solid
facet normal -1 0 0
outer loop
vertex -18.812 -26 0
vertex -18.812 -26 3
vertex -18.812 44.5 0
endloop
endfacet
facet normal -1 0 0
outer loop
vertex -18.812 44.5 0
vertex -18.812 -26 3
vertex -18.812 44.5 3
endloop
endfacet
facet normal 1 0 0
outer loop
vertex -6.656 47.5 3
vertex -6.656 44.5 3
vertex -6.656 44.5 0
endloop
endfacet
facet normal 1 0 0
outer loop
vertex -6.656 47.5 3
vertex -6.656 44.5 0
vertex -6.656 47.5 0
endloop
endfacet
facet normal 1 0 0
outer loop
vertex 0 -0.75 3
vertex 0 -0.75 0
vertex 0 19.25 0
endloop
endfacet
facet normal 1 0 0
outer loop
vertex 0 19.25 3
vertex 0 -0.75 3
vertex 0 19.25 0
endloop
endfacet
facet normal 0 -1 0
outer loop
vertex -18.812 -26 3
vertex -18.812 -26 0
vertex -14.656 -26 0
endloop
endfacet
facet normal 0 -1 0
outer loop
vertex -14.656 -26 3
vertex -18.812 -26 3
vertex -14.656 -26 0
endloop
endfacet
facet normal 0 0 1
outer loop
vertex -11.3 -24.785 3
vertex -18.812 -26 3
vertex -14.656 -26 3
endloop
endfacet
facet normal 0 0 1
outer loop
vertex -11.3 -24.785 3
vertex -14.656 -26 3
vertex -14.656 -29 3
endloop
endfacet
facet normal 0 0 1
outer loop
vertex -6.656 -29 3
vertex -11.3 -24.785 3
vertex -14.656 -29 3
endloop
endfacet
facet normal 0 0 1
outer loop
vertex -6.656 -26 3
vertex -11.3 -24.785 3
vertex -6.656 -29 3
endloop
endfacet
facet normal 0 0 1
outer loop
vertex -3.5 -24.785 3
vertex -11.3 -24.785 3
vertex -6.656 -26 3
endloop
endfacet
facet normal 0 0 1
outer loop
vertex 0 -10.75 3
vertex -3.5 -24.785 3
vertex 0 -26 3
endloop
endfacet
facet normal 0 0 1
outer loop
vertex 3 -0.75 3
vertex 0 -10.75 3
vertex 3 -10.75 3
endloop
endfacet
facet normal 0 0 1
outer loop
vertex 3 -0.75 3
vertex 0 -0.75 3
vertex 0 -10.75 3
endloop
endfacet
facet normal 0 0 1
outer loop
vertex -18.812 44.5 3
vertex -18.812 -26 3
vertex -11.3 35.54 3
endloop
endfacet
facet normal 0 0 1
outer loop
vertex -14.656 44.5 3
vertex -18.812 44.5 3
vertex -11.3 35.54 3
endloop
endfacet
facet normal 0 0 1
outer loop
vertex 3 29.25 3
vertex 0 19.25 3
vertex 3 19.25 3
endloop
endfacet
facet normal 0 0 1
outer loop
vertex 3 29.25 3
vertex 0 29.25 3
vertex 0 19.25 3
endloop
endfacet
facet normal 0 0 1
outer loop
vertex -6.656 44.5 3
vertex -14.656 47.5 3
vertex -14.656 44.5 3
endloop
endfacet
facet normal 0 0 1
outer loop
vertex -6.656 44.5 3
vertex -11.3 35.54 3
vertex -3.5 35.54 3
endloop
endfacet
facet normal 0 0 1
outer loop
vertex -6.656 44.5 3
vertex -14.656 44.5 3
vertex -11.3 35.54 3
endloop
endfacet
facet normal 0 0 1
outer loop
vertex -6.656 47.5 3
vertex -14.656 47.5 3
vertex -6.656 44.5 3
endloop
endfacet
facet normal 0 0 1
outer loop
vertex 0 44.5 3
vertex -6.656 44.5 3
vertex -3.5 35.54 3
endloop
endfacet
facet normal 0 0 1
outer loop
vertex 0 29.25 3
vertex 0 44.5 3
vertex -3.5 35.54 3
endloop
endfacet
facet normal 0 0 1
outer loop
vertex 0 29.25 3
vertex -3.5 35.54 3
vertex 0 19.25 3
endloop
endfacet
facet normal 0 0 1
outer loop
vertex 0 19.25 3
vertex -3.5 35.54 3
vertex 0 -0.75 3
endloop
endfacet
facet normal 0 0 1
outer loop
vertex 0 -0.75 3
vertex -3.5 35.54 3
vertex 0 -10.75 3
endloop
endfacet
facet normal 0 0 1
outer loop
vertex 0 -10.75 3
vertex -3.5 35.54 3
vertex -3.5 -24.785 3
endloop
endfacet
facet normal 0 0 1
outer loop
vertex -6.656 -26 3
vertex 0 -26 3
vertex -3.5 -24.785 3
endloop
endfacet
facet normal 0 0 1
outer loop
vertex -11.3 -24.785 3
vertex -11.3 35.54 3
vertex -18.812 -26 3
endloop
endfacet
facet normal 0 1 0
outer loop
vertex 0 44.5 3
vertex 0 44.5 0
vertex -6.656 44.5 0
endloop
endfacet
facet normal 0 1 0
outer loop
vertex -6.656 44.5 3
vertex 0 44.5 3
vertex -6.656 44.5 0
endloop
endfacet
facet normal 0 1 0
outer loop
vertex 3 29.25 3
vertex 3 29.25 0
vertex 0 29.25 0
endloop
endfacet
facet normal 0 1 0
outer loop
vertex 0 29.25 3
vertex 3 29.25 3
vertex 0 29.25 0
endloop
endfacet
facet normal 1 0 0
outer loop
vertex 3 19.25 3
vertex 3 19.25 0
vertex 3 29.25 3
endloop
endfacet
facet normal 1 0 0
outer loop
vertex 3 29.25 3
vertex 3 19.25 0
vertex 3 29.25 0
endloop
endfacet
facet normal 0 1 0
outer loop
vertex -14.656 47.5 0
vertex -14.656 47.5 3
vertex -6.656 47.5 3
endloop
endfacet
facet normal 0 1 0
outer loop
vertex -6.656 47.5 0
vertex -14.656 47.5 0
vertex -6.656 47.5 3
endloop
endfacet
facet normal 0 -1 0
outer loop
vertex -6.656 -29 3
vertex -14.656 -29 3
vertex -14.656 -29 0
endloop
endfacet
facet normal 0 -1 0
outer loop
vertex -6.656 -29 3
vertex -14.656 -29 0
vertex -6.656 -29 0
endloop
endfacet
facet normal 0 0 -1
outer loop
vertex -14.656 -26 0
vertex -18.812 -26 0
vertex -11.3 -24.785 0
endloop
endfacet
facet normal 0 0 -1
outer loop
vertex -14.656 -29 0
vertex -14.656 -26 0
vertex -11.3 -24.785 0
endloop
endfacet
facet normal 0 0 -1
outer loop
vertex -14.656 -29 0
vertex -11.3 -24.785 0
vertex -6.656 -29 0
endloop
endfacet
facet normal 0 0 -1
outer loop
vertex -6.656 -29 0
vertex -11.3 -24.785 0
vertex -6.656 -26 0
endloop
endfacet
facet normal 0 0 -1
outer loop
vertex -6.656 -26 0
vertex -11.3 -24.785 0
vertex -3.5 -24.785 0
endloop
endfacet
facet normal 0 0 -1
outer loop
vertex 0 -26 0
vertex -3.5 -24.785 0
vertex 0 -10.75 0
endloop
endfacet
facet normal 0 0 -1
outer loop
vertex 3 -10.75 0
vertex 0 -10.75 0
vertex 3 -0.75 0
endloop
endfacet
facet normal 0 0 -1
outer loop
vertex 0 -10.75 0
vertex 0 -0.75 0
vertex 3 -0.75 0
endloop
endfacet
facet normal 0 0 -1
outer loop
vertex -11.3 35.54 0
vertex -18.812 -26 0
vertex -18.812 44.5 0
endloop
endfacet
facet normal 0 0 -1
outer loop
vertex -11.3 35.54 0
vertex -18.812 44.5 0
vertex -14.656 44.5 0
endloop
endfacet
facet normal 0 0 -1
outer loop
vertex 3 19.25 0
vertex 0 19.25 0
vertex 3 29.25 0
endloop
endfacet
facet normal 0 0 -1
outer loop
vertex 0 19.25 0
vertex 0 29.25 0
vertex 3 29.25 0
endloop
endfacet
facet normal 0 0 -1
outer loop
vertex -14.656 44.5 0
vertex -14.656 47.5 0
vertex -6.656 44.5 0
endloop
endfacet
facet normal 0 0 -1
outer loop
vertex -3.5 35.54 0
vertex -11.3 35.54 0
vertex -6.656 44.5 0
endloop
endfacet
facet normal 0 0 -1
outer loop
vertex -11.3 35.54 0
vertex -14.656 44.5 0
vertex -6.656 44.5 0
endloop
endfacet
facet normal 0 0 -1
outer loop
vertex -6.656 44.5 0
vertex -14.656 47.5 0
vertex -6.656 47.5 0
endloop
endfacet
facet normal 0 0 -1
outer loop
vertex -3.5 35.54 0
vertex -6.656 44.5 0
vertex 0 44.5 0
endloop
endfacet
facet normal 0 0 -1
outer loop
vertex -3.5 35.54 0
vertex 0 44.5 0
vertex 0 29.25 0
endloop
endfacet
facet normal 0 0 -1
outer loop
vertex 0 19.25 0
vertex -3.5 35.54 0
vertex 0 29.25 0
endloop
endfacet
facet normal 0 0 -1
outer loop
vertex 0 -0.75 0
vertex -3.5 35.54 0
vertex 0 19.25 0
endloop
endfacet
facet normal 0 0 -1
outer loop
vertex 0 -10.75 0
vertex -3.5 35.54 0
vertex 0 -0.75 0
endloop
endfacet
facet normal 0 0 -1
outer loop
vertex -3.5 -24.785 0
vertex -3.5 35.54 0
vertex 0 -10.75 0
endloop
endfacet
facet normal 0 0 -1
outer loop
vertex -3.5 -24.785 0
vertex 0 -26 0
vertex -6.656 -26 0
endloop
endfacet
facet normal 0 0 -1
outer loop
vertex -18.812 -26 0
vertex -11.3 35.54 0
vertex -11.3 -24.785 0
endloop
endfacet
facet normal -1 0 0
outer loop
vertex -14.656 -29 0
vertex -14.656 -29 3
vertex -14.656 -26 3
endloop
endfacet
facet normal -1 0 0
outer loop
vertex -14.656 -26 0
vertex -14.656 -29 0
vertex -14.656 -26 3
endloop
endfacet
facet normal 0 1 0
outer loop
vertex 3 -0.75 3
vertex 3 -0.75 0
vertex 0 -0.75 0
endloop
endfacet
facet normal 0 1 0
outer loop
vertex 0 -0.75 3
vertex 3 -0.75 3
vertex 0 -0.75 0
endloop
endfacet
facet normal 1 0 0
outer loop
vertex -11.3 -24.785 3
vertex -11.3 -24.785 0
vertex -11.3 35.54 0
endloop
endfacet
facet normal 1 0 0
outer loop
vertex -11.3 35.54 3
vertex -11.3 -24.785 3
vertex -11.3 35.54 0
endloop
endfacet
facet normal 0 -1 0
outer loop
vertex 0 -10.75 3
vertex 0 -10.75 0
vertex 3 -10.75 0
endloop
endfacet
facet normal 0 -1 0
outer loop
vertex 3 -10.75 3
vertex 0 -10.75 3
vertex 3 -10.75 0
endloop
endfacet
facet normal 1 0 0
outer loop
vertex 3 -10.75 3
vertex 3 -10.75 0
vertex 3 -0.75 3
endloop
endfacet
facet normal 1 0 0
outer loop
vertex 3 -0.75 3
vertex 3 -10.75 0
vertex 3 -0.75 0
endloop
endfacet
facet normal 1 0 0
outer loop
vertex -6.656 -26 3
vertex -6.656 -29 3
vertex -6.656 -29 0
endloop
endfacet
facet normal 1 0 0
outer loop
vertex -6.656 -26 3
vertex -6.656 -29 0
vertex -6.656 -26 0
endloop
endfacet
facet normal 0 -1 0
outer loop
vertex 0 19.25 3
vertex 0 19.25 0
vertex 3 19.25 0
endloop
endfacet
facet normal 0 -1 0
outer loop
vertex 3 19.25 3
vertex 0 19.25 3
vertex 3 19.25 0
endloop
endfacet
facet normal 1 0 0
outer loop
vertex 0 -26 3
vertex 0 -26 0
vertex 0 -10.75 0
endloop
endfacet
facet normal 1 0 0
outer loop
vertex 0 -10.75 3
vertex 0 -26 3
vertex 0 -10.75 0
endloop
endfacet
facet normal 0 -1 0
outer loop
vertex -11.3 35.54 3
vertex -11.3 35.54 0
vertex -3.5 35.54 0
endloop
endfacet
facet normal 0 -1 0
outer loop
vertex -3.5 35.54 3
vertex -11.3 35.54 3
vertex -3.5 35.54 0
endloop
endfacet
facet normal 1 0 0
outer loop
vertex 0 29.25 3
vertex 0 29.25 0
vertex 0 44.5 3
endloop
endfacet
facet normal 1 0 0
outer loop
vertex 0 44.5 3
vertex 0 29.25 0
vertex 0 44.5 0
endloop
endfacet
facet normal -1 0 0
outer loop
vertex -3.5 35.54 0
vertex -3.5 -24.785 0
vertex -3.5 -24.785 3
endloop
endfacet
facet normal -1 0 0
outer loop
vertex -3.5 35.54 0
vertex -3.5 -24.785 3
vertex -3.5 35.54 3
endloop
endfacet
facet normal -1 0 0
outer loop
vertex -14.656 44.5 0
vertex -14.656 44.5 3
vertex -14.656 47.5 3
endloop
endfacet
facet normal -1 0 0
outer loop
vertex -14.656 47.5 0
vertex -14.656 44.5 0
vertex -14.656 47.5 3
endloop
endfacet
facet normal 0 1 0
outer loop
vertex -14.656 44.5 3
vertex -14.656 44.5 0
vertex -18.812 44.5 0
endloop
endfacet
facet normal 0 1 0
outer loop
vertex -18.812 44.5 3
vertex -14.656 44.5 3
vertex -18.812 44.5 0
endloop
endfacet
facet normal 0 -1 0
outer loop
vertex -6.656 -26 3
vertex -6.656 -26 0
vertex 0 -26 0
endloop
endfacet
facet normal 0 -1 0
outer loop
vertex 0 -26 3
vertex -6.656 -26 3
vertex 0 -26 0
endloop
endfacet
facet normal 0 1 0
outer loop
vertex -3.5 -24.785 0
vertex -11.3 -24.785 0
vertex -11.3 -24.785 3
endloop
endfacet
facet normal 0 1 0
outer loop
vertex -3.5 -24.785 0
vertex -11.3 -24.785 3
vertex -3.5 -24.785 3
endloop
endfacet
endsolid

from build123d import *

# Parameters (mm, degrees)
SKETCH1_W           = 7.8
SKETCH1_H           = 60.325
BOSS_EXTRUDE1_DEPTH = 3
SKETCH2_W           = 2.5
SKETCH2_H           = 70.5
CUT_EXTRUDE1_DEPTH  = 3
SKETCH3_W           = 8
SKETCH3_H           = 3
BOSS_EXTRUDE2_DEPTH = 3


with BuildPart() as part:
    # Sketch1 → Boss-Extrude1 (new body)
    with BuildSketch(Plane.XY):
        Polygon((3, -10.75), (3, -0.75), (0, -0.75), (0, 19.25), (3, 19.25), (3, 29.25), (0, 29.25), (0, 42.5), (0, 44.5), (-21.311841589, 44.5), (-21.311841589, -26), (-19.311841589, -26), (-2, -26), (0, -26), (0, -24), (0, -10.75), align=None)
        with Locations((-7.4, 5.3775)):
            Rectangle(SKETCH1_W, SKETCH1_H, mode=Mode.SUBTRACT)
    extrude(amount=BOSS_EXTRUDE1_DEPTH)

    # Sketch2 → Cut-Extrude1 (cut)
    with BuildSketch(Plane.XY.offset(3)):
        with Locations((-20.061841589, 9.25)):
            Rectangle(SKETCH2_W, SKETCH2_H)
    extrude(amount=-CUT_EXTRUDE1_DEPTH, mode=Mode.SUBTRACT)

    # Sketch3 → Boss-Extrude2 (add)
    with BuildSketch(Plane.XY.offset(3)):
        with Locations((-10.655920795, -27.5)):
            Rectangle(SKETCH3_W, SKETCH3_H)
        with Locations((-10.655920795, 46)):
            Rectangle(SKETCH3_W, SKETCH3_H)
    extrude(amount=-BOSS_EXTRUDE2_DEPTH)


solid = part.part
